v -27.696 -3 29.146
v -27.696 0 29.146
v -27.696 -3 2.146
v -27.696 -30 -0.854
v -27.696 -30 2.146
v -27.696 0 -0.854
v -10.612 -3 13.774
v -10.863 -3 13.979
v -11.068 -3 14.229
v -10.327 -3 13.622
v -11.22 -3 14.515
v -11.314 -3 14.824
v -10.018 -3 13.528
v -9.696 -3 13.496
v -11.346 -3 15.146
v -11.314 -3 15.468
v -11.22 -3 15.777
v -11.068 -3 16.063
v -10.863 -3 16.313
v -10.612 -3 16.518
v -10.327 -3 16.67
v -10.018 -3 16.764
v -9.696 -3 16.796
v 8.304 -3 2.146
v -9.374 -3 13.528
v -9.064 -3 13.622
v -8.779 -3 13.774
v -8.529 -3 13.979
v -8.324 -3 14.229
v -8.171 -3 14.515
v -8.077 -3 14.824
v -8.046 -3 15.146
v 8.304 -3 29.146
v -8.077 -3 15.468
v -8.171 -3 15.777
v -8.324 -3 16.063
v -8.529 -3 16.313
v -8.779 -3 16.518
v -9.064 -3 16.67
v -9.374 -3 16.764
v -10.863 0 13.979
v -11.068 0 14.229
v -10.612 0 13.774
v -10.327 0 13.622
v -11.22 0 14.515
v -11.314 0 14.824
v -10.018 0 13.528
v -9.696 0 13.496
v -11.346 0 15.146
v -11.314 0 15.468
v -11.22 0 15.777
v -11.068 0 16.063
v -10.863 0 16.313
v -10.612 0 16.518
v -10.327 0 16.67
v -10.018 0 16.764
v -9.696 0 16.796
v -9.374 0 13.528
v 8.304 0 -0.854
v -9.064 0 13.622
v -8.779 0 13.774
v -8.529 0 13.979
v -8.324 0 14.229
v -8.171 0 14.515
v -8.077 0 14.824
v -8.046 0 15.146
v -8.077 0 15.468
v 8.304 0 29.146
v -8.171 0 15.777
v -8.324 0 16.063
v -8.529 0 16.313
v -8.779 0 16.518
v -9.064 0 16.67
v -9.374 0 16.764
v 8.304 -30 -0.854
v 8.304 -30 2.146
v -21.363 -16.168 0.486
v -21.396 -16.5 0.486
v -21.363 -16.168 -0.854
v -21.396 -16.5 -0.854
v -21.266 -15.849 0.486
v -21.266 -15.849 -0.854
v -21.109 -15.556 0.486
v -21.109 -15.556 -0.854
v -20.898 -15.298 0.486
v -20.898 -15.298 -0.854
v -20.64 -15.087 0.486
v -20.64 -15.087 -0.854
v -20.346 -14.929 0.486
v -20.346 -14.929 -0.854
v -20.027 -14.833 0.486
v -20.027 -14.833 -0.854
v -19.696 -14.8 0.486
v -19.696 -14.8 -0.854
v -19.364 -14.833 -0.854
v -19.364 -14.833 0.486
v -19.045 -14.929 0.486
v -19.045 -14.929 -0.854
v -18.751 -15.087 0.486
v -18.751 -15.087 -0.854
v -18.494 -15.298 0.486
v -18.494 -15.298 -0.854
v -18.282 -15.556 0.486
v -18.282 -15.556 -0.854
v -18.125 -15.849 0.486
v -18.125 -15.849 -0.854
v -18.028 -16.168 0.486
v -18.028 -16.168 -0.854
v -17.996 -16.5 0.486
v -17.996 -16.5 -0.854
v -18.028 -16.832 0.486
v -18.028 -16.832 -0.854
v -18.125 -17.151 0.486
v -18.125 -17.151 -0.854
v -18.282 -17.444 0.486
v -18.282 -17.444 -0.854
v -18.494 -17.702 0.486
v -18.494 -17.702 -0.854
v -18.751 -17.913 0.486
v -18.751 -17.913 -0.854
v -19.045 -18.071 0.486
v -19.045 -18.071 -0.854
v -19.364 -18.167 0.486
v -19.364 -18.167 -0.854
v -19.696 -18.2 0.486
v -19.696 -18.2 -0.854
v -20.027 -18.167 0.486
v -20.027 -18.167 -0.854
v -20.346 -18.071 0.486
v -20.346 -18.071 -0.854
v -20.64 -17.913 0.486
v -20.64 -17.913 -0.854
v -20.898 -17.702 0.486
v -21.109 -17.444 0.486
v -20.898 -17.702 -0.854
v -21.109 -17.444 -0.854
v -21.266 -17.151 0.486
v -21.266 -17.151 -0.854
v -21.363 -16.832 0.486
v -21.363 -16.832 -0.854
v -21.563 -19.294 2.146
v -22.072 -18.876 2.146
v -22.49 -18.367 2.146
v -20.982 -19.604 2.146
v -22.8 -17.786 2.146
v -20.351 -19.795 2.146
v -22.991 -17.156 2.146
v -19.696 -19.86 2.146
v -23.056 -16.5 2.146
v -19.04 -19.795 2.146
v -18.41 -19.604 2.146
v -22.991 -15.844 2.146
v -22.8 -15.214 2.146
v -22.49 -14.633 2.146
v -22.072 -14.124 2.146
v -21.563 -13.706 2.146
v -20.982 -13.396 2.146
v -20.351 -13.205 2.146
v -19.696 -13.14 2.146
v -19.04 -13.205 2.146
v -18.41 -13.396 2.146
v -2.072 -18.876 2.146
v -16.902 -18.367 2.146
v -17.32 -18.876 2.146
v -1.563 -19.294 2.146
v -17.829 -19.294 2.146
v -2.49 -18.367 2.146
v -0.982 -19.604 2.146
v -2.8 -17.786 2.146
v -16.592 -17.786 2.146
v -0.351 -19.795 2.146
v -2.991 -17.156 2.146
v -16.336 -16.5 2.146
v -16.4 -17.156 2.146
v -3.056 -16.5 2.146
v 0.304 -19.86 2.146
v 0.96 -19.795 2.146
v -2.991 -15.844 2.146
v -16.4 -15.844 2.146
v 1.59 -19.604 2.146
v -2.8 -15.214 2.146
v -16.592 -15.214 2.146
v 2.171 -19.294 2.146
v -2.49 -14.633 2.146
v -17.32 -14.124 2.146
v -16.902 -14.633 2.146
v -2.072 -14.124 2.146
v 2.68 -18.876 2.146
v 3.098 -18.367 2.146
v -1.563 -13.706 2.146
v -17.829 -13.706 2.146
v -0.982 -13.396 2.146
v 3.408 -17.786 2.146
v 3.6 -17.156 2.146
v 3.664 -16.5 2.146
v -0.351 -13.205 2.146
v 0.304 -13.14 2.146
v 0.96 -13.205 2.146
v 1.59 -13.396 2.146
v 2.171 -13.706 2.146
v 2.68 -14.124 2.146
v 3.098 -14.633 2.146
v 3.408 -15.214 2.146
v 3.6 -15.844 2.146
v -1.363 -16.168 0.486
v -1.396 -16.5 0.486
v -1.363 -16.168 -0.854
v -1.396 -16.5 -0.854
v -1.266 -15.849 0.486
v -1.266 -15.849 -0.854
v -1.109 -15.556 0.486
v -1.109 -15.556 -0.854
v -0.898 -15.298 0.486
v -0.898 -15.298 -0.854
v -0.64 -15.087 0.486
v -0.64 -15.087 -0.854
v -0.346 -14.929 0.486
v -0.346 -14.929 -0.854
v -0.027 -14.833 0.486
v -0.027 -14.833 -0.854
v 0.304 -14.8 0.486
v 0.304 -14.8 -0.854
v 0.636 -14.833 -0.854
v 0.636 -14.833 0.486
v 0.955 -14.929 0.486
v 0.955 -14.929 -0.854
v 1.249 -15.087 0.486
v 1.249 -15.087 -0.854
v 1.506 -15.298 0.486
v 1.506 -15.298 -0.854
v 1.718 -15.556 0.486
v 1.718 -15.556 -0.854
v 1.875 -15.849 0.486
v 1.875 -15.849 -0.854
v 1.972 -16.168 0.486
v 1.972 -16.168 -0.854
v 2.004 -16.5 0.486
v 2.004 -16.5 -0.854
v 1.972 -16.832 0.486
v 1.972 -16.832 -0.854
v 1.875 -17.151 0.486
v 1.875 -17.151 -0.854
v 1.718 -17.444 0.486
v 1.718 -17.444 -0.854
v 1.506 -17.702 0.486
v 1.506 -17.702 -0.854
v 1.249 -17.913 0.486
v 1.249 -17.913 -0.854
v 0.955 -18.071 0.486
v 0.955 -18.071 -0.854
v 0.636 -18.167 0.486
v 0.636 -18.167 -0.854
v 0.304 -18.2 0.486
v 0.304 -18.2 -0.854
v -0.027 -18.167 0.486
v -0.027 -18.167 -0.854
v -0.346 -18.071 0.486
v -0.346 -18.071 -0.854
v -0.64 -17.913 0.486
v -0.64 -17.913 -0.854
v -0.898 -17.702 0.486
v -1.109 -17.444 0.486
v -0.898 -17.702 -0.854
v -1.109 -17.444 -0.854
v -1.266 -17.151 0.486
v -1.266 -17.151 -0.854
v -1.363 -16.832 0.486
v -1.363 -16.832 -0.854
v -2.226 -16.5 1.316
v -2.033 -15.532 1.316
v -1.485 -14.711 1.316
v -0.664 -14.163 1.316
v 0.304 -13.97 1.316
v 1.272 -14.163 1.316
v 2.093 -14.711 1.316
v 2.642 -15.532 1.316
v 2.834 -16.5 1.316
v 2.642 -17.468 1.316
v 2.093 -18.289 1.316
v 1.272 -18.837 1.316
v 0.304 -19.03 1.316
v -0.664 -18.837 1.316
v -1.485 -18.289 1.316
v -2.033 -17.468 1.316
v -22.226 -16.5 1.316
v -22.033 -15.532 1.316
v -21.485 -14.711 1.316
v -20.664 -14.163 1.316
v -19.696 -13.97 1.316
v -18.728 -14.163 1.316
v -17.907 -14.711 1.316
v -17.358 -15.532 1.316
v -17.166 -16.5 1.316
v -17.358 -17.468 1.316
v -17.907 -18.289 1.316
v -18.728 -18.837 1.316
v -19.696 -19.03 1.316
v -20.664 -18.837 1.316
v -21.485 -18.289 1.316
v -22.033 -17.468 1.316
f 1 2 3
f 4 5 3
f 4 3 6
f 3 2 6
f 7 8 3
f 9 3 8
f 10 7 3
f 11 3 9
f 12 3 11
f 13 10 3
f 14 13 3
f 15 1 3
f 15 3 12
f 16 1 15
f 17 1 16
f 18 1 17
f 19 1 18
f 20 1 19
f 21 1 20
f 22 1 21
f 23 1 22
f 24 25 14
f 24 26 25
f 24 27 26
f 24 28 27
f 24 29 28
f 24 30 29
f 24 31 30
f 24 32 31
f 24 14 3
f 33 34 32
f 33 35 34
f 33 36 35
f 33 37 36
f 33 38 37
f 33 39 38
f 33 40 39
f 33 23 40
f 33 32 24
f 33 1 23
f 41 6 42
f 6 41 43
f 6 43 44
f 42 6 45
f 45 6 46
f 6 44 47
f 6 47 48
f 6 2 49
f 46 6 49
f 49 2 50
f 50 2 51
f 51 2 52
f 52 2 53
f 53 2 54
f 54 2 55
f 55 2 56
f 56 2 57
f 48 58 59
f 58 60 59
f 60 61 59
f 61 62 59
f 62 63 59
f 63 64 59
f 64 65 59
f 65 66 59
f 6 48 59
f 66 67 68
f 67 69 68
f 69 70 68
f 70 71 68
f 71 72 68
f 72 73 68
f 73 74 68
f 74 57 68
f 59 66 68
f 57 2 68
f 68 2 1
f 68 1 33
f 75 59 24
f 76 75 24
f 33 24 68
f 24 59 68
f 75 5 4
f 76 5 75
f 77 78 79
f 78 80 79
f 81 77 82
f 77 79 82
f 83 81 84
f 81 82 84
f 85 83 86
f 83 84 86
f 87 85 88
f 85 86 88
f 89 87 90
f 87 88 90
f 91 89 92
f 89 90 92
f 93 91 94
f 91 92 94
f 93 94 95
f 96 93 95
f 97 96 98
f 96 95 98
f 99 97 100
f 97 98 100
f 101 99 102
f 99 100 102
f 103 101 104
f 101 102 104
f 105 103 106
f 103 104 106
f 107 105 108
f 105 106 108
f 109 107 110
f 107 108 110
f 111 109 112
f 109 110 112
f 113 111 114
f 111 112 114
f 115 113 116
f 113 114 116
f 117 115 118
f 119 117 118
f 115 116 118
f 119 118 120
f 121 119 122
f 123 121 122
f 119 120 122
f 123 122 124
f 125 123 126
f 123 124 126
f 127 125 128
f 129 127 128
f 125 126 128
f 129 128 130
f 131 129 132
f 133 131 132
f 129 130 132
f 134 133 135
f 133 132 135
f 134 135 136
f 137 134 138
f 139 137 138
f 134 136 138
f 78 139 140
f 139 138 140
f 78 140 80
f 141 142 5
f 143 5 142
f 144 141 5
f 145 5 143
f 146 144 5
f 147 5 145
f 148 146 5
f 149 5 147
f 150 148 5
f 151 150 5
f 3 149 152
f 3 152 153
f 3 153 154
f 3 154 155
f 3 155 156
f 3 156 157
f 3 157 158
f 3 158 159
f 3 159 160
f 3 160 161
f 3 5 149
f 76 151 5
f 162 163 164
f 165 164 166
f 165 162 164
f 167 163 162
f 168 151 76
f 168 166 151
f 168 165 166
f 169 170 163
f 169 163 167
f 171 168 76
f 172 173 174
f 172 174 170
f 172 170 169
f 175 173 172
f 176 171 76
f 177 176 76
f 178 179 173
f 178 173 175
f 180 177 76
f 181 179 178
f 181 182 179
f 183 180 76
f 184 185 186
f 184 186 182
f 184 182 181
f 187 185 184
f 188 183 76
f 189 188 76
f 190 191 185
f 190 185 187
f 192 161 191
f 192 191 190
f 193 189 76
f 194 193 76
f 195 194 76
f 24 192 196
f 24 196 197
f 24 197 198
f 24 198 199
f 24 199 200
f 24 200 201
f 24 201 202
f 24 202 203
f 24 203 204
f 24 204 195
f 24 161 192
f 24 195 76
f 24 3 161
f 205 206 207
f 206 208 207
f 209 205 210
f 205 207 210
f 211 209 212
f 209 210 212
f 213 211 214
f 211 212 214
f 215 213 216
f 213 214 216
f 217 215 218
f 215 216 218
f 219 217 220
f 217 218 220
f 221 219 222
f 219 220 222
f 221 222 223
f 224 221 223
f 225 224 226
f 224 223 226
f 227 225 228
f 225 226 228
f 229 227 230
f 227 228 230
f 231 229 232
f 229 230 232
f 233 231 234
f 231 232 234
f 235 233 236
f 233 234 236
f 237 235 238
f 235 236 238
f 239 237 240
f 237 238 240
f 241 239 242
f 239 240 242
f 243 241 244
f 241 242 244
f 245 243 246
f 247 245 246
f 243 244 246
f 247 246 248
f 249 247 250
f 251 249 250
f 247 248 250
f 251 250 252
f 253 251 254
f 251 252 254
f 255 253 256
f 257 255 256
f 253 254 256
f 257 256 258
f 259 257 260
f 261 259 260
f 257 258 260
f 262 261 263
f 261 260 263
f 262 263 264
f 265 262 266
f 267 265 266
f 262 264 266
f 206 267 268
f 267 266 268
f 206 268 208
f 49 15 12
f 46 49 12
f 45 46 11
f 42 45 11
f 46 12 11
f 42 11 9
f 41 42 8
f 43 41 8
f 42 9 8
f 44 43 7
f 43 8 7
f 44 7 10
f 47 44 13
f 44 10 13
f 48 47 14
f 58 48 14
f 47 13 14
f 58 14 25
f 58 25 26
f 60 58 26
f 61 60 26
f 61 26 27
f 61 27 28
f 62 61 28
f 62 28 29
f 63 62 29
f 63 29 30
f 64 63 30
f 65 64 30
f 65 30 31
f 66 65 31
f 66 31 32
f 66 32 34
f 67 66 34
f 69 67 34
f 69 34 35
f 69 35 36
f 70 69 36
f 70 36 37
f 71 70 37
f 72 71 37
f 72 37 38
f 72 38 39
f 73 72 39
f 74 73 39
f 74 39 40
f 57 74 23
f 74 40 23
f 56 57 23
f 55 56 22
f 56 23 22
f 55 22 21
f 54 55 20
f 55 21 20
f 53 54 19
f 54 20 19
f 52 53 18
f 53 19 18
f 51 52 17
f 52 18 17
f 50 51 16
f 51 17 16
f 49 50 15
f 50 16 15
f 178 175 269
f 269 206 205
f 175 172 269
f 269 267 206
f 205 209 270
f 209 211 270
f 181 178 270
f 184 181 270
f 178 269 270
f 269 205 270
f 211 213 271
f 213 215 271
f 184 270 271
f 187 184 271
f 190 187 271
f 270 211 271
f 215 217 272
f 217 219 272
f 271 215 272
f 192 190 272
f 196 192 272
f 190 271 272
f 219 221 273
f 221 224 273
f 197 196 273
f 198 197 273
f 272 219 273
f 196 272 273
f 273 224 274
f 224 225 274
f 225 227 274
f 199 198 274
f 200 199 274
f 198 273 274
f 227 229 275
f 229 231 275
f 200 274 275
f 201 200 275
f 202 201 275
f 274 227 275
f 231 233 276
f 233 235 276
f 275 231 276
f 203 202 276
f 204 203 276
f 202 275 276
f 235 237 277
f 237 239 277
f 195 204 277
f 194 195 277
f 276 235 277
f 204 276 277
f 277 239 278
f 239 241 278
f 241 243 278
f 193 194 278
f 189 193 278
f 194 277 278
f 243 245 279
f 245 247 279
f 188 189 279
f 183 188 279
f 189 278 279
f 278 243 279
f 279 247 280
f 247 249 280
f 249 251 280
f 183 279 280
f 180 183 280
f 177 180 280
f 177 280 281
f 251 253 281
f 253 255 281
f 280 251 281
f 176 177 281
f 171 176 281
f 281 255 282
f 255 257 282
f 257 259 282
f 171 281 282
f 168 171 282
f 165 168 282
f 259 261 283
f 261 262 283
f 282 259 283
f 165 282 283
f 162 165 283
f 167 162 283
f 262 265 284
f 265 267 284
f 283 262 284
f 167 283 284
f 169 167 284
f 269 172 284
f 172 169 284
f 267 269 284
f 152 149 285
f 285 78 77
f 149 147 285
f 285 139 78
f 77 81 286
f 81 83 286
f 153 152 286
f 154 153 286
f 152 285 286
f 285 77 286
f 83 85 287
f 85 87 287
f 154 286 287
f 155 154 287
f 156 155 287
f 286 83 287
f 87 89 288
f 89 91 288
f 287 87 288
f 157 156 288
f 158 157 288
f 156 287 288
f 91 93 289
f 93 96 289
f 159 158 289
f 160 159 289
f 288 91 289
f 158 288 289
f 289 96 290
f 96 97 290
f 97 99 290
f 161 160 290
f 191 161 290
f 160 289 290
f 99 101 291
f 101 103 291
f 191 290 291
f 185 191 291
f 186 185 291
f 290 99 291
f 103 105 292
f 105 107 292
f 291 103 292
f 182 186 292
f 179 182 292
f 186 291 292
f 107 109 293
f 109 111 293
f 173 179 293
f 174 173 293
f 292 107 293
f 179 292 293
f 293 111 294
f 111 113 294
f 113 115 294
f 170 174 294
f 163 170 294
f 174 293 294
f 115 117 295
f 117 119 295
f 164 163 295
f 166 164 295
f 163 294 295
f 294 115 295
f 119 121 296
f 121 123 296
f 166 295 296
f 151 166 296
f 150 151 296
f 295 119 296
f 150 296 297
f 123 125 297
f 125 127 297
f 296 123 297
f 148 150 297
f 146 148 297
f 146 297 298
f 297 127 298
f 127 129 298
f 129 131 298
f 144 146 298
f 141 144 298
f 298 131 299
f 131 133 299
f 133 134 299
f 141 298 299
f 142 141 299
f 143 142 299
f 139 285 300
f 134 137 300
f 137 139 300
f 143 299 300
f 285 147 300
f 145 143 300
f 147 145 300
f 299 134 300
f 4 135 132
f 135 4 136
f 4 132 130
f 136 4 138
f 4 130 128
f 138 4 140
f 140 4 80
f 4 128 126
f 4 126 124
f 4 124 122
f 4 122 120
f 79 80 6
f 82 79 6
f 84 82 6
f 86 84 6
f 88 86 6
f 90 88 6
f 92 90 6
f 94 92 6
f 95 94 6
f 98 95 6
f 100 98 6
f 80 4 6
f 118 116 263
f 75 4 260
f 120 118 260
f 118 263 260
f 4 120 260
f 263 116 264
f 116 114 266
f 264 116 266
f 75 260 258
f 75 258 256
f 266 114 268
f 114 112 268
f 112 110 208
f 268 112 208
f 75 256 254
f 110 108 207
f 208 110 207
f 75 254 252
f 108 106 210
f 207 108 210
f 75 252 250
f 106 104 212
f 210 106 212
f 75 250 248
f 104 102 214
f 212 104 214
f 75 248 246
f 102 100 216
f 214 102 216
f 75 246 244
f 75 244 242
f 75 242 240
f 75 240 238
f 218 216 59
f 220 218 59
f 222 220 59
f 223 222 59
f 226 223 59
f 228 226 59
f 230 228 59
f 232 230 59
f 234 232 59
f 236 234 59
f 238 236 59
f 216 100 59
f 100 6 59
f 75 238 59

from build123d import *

# Parameters (mm, degrees)
F0_W           = 36
F0_H           = 3
F1_DEPTH       = 30
F0_H_2         = 27
F2_DEPTH       = 3
F4_D           = 3.4
F4_CSINK_D     = 6.72
F4_CSINK_ANGLE = 90
F5_D           = 3.3


with BuildPart() as f1:
    # F0 (on Front) → F1 (new body)
    with BuildSketch(Plane.XZ):
        with Locations((-9.6957933456, 0.646031009)):
            Rectangle(F0_W, F0_H)
    extrude(amount=F1_DEPTH)

    # F0 (on Front) → F2 (join)
    with BuildSketch(Plane.XZ):
        with Locations((-9.6957933456, 15.646031009)):
            Rectangle(F0_W, F0_H_2)
        with Locations((-9.6957933456, 0.646031009)):
            Rectangle(F0_W, F0_H)
    extrude(amount=F2_DEPTH)

    # F4 (through all)
    with Locations(Plane.XY.offset(2.146031009)):
        with Locations((-19.6957933456, -16.5), (0.3042066544, -16.5)):
            CounterSinkHole(F4_D / 2, F4_CSINK_D / 2, counter_sink_angle=F4_CSINK_ANGLE)

    # F5 (through all)
    with Locations(Plane(origin=(0, 0, 0), x_dir=(1, 0, 0), z_dir=(0, 1, 0))):
        with Locations((-9.6957933456, -15.146031009)):
            Hole(F5_D / 2)


solid = f1.part
